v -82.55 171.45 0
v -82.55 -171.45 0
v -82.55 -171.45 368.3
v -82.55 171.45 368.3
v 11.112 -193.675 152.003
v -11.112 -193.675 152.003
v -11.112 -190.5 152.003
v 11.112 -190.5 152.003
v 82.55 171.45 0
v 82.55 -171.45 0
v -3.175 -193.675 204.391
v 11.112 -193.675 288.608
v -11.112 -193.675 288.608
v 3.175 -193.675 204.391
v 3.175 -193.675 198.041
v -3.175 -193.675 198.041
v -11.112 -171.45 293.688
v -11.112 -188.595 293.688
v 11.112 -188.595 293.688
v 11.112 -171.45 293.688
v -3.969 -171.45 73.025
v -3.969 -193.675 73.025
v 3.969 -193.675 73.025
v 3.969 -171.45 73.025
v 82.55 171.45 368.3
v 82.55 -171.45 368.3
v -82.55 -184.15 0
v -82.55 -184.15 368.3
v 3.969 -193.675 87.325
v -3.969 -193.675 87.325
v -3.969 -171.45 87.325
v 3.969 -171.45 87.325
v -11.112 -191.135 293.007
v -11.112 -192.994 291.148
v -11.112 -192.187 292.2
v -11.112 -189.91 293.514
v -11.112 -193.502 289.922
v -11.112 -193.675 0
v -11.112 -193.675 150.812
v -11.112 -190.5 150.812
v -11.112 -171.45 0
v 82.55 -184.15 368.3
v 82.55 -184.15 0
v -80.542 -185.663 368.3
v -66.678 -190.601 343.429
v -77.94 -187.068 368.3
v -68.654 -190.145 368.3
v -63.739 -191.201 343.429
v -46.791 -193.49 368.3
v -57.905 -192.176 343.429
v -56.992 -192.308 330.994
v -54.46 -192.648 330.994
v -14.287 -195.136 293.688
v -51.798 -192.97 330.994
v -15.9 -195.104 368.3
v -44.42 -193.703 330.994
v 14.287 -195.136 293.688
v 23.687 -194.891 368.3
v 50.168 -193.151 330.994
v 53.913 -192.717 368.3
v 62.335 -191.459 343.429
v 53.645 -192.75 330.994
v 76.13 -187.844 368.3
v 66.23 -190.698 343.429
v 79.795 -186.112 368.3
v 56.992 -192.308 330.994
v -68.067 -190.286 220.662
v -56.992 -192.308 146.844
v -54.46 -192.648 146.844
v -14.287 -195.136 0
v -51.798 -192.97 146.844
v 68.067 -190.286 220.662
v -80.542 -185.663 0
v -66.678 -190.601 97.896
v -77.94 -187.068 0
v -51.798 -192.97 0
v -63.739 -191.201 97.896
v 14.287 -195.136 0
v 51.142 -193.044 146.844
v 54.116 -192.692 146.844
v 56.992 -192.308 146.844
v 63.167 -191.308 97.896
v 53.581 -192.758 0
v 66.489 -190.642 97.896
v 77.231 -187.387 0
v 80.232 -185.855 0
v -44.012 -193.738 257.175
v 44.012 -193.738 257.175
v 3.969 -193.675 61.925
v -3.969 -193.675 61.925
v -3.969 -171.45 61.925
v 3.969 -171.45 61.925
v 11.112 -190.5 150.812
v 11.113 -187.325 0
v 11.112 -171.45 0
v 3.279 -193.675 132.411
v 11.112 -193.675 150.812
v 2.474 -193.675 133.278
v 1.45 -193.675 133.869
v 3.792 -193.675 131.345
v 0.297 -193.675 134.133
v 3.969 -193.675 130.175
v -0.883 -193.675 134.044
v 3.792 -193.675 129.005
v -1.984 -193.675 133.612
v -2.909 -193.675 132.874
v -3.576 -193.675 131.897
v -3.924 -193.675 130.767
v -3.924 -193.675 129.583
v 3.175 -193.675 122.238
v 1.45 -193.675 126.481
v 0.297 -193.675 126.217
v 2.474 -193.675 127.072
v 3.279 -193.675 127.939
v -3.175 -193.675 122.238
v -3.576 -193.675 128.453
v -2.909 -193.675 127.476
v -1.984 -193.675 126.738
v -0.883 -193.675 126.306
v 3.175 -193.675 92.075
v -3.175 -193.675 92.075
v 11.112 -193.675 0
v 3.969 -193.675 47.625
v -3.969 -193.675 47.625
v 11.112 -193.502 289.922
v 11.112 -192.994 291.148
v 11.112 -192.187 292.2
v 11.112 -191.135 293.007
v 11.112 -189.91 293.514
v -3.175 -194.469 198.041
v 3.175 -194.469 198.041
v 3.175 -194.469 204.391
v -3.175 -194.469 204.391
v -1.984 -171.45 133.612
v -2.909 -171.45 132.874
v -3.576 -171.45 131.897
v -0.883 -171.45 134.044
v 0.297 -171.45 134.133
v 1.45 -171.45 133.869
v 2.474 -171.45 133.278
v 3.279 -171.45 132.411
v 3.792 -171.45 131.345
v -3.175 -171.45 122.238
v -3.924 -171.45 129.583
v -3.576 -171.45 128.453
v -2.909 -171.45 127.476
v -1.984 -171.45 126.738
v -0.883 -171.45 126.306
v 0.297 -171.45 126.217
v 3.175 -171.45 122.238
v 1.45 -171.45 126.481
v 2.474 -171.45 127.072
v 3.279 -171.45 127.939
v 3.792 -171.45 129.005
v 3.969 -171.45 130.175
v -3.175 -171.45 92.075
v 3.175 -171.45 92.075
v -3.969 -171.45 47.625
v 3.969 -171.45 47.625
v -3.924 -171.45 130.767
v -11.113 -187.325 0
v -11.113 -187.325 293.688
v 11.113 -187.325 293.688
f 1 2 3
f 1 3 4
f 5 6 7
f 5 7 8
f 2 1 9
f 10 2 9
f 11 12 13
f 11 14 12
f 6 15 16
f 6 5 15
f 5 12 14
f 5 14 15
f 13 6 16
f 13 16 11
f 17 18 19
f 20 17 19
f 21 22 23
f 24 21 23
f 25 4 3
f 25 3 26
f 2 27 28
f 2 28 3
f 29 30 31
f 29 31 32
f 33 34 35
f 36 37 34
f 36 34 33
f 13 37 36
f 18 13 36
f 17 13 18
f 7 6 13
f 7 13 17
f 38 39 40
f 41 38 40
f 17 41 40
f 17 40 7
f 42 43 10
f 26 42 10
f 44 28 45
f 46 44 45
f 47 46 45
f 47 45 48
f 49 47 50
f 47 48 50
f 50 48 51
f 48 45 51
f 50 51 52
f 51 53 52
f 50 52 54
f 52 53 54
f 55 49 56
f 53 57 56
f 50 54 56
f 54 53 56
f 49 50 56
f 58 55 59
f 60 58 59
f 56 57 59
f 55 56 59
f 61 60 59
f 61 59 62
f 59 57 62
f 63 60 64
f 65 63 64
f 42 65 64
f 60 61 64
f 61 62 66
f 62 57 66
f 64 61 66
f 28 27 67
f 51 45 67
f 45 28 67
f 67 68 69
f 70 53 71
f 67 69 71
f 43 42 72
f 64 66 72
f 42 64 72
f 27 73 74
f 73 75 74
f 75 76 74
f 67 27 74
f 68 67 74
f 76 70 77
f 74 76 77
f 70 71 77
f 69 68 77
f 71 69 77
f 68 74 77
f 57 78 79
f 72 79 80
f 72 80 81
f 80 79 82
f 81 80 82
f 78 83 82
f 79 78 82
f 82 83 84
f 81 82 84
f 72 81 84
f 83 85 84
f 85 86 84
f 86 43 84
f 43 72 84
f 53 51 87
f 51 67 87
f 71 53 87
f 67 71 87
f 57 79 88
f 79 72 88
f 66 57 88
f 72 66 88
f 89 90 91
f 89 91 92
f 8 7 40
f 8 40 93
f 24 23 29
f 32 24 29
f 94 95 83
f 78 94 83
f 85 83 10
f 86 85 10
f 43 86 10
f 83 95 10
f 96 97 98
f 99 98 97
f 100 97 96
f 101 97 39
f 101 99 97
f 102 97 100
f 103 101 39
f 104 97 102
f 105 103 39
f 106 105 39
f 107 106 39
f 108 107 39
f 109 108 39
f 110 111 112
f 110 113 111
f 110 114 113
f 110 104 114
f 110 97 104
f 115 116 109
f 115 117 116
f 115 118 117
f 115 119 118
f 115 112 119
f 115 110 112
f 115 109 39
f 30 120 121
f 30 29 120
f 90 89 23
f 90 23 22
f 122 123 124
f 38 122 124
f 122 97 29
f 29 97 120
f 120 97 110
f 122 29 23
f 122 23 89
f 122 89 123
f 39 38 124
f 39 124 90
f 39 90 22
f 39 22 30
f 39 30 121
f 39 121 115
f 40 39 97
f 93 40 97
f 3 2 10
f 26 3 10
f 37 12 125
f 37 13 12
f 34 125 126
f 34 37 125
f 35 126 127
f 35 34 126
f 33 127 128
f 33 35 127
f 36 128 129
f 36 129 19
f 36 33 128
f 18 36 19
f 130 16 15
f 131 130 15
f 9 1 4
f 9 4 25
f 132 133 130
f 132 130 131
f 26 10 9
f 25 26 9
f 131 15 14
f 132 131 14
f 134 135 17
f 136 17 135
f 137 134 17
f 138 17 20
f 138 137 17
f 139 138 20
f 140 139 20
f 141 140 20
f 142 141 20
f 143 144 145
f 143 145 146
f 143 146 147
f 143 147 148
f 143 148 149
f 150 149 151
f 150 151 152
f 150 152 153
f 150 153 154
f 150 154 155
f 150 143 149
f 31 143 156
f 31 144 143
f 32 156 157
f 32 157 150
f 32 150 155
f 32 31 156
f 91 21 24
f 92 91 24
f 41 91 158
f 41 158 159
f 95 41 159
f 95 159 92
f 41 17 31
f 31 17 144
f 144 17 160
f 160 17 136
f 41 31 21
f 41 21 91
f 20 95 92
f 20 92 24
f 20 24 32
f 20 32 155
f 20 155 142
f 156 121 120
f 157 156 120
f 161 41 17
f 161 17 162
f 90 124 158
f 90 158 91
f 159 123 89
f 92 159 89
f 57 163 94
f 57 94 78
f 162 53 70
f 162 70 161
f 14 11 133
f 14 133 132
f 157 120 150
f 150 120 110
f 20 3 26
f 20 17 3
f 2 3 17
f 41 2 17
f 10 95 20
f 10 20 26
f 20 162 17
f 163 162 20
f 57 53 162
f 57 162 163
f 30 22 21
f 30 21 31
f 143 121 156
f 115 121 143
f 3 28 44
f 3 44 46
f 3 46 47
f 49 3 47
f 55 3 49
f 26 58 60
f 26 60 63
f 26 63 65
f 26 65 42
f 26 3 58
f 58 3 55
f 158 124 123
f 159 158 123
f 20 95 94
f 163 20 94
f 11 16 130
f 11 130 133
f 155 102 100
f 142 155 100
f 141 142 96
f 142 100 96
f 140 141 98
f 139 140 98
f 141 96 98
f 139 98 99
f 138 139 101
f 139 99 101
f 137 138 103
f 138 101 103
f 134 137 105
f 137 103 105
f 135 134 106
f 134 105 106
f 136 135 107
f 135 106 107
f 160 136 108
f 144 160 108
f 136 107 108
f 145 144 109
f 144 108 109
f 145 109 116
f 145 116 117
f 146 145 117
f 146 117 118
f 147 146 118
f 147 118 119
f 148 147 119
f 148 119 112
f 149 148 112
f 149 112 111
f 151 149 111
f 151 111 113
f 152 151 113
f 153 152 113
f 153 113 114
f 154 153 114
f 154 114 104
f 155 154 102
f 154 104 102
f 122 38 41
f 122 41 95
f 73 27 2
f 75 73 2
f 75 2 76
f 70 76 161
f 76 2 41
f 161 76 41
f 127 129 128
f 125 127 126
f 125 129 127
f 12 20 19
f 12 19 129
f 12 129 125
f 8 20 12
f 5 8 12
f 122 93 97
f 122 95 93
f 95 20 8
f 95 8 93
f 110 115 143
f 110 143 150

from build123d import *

# Parameters (mm, degrees)
F0_W      = 165.1
F0_H      = 342.9
F1_DEPTH  = 368.3
F2_W      = 165.1
F2_H      = 12.7
F3_DEPTH  = 368.3
F4_W      = 22.225
F4_H      = 15.875
F5_DEPTH  = 293.6875
F7_DEPTH  = 293.6875
F8_R      = 5.08
F9_W      = 22.225
F9_H      = 1.190625
F10_DEPTH = 3.175
F11_W     = 6.35
F11_H     = 6.35
F12_DEPTH = 0.79375
F13_R     = 3.96875
F13_W     = 6.35
F13_H     = 30.1625
F13_W_2   = 7.9375
F13_H_2   = 14.3002
F14_DEPTH = 22.225


with BuildPart() as f1:
    # F0 (on Top) → F1 (new body)
    with BuildSketch(Plane.XY):
        Rectangle(F0_W, F0_H)
    extrude(amount=F1_DEPTH)


with BuildPart() as f3:
    # F2 (on Top) → F3 (new body, through all)
    with BuildSketch(Plane.XY):
        with Locations((0, -177.8)):
            Rectangle(F2_W, F2_H)
        with BuildLine():
            Line((82.55, -184.15), (-82.55, -184.15))
            add(Edge.make_bspline(
                [(-82.55, -184.15), (-72.8849023581, -192.9987818003), (0, -197.5262181997), (72.8849023581, -192.9987818003), (82.55, -184.15)],
                knots=[0, 0, 0, 0, 0.5, 1, 1, 1, 1], degree=3))
        make_face()
    extrude(amount=F3_DEPTH)

    # F4 (on face) → F5 (cut)
    with BuildSketch(Plane(origin=(0, 0, 0), x_dir=(1, 0, 0), z_dir=(0, 0, -1))):
        with Locations((0, 179.3875)):
            Rectangle(F4_W, F4_H)
        Polygon((-14.3390173603, 195.2625), (-11.1125, 187.325), (11.1125, 187.325), (14.3390173603, 195.2625), align=None)
    extrude(amount=-F5_DEPTH, mode=Mode.SUBTRACT)


with BuildPart() as f7:
    # F6 (on face) → F7 (new body, through all)
    with BuildSketch(Plane(origin=(0, 0, 0), x_dir=(1, 0, 0), z_dir=(0, 0, -1))):
        Polygon((-11.1125, 193.675), (-11.1125, 171.45), (11.1125, 171.45), (11.1125, 187.325), (11.1125, 193.675), align=None)
    extrude(amount=-F7_DEPTH)

    # F8
    f8_edges = [f7.edges().sort_by_distance(p)[0] for p in [
        (0, -193.675, 293.6875),
    ]]
    fillet(f8_edges, radius=F8_R)

    # F9 (on face) → F10 (cut)
    with BuildSketch(Plane.XZ.offset(193.675)):
        with Locations((0, 151.4078125)):
            Rectangle(F9_W, F9_H)
    extrude(amount=-F10_DEPTH, mode=Mode.SUBTRACT)

    # F11 (on face) → F12 (join)
    with BuildSketch(Plane.XZ.offset(193.675)):
        with Locations((0, 201.215625)):
            Rectangle(F11_W, F11_H)
    extrude(amount=F12_DEPTH)

    # F13 (on face) → F14 (cut, through all)
    with BuildSketch(Plane.XZ.offset(193.675)):
        with Locations((0, 130.175)):
            Circle(F13_R)
        with Locations((0, 107.15625)):
            Rectangle(F13_W, F13_H)
        with Locations((0, 80.1751)):
            Rectangle(F13_W_2, F13_H_2)
        with Locations((0, 54.7751)):
            Rectangle(F13_W_2, F13_H_2)
    extrude(amount=-F14_DEPTH, mode=Mode.SUBTRACT)


solid = Compound([f1.part, f3.part, f7.part])
